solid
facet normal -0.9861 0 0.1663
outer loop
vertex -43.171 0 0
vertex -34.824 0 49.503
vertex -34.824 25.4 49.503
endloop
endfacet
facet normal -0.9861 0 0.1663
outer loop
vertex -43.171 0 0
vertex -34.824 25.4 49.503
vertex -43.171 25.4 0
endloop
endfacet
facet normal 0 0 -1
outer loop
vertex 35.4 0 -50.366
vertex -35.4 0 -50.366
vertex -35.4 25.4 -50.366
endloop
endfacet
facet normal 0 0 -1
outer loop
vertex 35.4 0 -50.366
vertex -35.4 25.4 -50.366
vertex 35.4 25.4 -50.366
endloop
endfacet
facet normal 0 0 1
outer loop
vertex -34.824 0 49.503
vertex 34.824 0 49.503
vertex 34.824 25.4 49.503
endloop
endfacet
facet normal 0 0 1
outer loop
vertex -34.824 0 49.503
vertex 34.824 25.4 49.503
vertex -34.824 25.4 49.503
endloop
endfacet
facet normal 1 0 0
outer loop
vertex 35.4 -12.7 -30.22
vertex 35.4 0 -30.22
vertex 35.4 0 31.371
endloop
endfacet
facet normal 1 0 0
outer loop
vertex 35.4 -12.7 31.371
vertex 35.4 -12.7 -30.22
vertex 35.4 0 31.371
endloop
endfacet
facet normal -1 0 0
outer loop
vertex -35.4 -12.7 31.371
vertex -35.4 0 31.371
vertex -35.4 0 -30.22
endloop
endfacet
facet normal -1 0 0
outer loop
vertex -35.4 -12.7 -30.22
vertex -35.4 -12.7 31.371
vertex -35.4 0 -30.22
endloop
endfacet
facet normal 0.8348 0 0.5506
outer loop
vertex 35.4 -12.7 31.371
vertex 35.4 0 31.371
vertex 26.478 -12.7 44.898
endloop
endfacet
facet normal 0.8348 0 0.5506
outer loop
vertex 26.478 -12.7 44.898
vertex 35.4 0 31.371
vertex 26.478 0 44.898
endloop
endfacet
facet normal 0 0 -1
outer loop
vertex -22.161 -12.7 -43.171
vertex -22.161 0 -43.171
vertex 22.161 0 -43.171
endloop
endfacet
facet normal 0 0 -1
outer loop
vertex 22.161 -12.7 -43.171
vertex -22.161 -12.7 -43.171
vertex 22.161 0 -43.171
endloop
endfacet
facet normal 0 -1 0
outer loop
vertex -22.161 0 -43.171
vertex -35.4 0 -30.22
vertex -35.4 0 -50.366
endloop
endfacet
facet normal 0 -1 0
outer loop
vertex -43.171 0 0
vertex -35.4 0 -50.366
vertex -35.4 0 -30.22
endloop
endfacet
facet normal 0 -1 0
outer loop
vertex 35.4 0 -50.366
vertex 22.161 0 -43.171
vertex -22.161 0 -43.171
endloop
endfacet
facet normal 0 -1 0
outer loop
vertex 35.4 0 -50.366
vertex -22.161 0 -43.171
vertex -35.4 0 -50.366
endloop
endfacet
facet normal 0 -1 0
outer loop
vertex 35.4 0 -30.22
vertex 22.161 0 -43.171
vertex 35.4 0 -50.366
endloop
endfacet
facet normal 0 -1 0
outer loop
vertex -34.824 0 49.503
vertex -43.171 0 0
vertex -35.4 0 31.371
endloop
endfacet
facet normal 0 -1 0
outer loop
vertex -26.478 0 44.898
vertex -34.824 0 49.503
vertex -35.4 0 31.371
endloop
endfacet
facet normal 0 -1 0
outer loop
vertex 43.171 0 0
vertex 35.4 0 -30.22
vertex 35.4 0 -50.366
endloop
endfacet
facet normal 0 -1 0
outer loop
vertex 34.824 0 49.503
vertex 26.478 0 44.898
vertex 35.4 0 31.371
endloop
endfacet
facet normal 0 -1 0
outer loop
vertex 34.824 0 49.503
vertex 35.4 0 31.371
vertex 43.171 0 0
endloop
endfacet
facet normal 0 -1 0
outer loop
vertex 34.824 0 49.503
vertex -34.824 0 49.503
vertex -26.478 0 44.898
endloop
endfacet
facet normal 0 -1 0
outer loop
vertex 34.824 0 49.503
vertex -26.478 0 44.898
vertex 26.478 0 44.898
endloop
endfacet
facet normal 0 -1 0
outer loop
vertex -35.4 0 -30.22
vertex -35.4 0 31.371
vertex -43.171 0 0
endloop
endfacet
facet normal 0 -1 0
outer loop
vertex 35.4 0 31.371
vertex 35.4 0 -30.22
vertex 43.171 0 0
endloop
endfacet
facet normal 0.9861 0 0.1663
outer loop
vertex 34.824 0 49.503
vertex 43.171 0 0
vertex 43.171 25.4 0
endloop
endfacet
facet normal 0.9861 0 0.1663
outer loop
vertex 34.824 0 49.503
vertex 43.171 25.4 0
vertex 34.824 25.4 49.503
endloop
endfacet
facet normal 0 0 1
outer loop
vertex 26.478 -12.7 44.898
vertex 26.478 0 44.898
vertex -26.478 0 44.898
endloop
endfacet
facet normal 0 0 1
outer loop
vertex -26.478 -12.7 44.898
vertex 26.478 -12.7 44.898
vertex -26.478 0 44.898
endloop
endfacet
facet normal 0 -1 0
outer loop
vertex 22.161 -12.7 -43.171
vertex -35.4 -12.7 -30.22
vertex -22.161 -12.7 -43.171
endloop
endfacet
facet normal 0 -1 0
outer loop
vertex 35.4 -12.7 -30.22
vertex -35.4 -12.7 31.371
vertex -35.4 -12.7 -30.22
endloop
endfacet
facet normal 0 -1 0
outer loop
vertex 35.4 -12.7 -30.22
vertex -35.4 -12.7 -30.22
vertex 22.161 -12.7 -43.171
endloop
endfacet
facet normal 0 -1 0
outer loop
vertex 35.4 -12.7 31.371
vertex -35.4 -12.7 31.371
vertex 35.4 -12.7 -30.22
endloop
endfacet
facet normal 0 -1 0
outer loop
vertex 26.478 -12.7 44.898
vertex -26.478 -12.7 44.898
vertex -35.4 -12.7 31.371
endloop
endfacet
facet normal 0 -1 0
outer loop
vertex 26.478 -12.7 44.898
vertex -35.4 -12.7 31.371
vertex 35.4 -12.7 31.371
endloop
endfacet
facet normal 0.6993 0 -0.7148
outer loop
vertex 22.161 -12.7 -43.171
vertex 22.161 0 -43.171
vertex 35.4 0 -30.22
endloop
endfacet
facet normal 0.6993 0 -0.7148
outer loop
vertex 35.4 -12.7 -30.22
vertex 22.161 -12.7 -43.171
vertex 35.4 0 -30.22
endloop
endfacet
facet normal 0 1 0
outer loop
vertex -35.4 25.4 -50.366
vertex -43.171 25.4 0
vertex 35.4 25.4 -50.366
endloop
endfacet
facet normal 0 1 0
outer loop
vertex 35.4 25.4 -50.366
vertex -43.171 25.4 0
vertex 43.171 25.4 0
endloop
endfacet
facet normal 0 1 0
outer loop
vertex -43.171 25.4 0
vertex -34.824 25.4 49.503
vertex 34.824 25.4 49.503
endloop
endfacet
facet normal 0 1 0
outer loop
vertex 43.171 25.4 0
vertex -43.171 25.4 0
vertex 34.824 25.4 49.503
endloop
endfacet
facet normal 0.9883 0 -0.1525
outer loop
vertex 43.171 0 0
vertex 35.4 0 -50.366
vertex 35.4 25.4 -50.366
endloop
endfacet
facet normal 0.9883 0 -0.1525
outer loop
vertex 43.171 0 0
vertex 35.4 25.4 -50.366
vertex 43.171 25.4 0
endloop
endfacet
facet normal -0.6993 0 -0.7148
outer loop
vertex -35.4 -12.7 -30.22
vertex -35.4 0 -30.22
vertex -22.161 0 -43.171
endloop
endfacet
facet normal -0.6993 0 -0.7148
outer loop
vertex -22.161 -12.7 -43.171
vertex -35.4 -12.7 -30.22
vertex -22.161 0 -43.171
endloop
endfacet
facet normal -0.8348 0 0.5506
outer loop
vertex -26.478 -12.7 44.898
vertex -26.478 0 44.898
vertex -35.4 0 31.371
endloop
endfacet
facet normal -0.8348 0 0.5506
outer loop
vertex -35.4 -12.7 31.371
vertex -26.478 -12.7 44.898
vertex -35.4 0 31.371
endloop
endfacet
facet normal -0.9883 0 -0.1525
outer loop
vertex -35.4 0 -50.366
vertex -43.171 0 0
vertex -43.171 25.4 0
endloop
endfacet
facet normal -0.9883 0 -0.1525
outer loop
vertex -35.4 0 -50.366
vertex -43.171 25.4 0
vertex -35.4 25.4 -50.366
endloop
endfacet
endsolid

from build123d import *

# Parameters (mm, degrees)
F1_DEPTH = 25.4
F2_DEPTH = 12.7
F4_DEPTH = 25.4


# Not quite as in the source:
# - the program builds the solid bodies; features that only make, move or delete a surface that nothing else refers to are left out


with BuildPart() as f1:
    # F0 (on Front) → F1 (new body)
    with BuildSketch(Plane.XZ):
        Polygon((-22.1610441804, -43.1708656251), (0, -43.1708656251), (22.1610441804, -43.1708656251), (35.4001075029, -30.2196051925), (35.4001075029, 31.3708260655), (26.4781303704, 44.897697866), (0, 44.897697866), (-26.4781303704, 44.897697866), (-35.4001075029, 31.3708260655), (-35.4001075029, -30.2196051925), align=None)
    extrude(amount=F1_DEPTH)

    # F2 (cut): a face of the model
    f2_faces = [f1.faces().sort_by_distance(p)[0] for p in [
        (0, -25.4, 1.2066431814),
    ]]
    extrude(f2_faces, amount=-F2_DEPTH, mode=Mode.SUBTRACT)

    # F3 (on Front) → F4 (join)
    with BuildSketch(Plane.XZ):
        Polygon((34.8244979978, 49.5025888085), (0, 49.5025888085), (-34.8244979978, 49.5025888085), (-43.1708618999, 0), (-35.4001075029, -50.3660067916), (0, -50.3660067916), (35.4001075029, -50.3660067916), (43.1708618999, 0), align=None)
    extrude(amount=-F4_DEPTH)


solid = f1.part
